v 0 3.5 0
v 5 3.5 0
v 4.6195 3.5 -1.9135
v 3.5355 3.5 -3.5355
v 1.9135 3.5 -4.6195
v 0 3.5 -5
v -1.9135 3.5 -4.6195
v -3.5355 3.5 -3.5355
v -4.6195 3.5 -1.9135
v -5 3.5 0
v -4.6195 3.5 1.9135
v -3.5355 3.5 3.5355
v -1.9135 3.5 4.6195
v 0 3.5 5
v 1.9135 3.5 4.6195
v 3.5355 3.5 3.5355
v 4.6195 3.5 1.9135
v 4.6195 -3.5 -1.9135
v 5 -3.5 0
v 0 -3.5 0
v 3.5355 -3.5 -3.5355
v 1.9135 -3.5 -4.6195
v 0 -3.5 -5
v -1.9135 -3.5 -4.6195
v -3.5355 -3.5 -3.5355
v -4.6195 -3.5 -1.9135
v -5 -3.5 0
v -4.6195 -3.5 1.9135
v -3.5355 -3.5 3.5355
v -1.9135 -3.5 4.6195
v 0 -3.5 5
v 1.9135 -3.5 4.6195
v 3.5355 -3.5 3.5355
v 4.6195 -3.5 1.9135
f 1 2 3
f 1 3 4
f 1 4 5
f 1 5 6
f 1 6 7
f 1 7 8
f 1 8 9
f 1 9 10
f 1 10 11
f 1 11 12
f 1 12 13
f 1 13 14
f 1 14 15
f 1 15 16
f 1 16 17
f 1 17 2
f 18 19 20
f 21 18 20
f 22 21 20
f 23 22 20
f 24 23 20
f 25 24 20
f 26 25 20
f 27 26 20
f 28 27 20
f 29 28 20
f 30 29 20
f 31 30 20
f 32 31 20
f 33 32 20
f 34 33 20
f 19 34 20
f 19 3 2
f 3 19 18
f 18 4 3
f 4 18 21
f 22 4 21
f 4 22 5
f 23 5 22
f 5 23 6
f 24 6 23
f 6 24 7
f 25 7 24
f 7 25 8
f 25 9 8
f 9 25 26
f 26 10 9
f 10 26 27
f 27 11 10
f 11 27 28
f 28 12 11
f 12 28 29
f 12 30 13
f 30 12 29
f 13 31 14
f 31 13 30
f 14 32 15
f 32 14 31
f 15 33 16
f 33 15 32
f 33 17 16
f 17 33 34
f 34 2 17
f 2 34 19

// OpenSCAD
// file: ../p/4-4edge.scad
use <../lib.scad>
function ldraw_lib__4_4edge() = [
// 0 Circle 1.0
// 0 Name: 4-4edge.dat
// 0 Author: James Jessiman
// 0 !LDRAW_ORG Primitive UPDATE 2017-01
// 0 !LICENSE Licensed under CC BY 4.0 : see CAreadme.txt
// 
// 0 BFC CERTIFY CCW
  [0,"BFC","CERTIFY"],
  [0,"BFC","CCW"],
// 
// 0 !HISTORY 1998-12-15 [PTadmin] Official Update 1998-10
// 0 !HISTORY 2005-12-28 [PTadmin] Official Update 2005-01
// 0 !HISTORY 2007-06-24 [PTadmin] Header formatted for Contributor Agreement
// 0 !HISTORY 2008-07-01 [PTadmin] Official Update 2008-01
// 0 !HISTORY 2017-01-15 [Steffen] BFCed
// 0 !HISTORY 2017-12-30 [PTadmin] Official Update 2017-01
// 
// 
// 2 24 1 0 0 0.9239 0 0.3827
  [2,24,1,0,0,0.9239,0,0.3827],
// 2 24 0.9239 0 0.3827 0.7071 0 0.7071
  [2,24,0.9239,0,0.3827,0.7071,0,0.7071],
// 2 24 0.7071 0 0.7071 0.3827 0 0.9239
  [2,24,0.7071,0,0.7071,0.3827,0,0.9239],
// 2 24 0.3827 0 0.9239 0 0 1
  [2,24,0.3827,0,0.9239,0,0,1],
// 2 24 0 0 1 -0.3827 0 0.9239
  [2,24,0,0,1,-0.3827,0,0.9239],
// 2 24 -0.3827 0 0.9239 -0.7071 0 0.7071
  [2,24,-0.3827,0,0.9239,-0.7071,0,0.7071],
// 2 24 -0.7071 0 0.7071 -0.9239 0 0.3827
  [2,24,-0.7071,0,0.7071,-0.9239,0,0.3827],
// 2 24 -0.9239 0 0.3827 -1 0 -0
  [2,24,-0.9239,0,0.3827,-1,0,-0],
// 2 24 -1 0 -0 -0.9239 0 -0.3827
  [2,24,-1,0,-0,-0.9239,0,-0.3827],
// 2 24 -0.9239 0 -0.3827 -0.7071 0 -0.7071
  [2,24,-0.9239,0,-0.3827,-0.7071,0,-0.7071],
// 2 24 -0.7071 0 -0.7071 -0.3827 0 -0.9239
  [2,24,-0.7071,0,-0.7071,-0.3827,0,-0.9239],
// 2 24 -0.3827 0 -0.9239 0 0 -1
  [2,24,-0.3827,0,-0.9239,0,0,-1],
// 2 24 0 0 -1 0.3827 0 -0.9239
  [2,24,0,0,-1,0.3827,0,-0.9239],
// 2 24 0.3827 0 -0.9239 0.7071 0 -0.7071
  [2,24,0.3827,0,-0.9239,0.7071,0,-0.7071],
// 2 24 0.7071 0 -0.7071 0.9239 0 -0.3827
  [2,24,0.7071,0,-0.7071,0.9239,0,-0.3827],
// 2 24 0.9239 0 -0.3827 1 0 0
  [2,24,0.9239,0,-0.3827,1,0,0],
];
module ldraw_lib__4_4edge(step=0, col=false, unit=2/5, alt=false, line=0.2, solid=!$preview)
    makepoly(ldraw_lib__4_4edge(), step=step, col=col, unit=unit, alt=alt, line=line, solid=solid);
ldraw_lib__4_4edge(line=0.2);
// file: ../p/4-4cyli.scad
use <../lib.scad>
function ldraw_lib__4_4cyli() = [
// 0 Cylinder 1.0
// 0 Name: 4-4cyli.dat
// 0 Author: James Jessiman
// 0 !LDRAW_ORG Primitive UPDATE 2005-01
// 0 !LICENSE Licensed under CC BY 4.0 : see CAreadme.txt
// 
// 0 BFC CERTIFY CCW
  [0,"BFC","CERTIFY"],
  [0,"BFC","CCW"],
// 
// 0 !HISTORY 1998-12-15 [PTadmin] Official Update 1998-10
// 0 !HISTORY 2002-03-23 [sbliss] Added BFC statement; merged headers from files in distributions LDraw 0.27 and Complete.
// 0 !HISTORY 2002-04-25 [PTadmin] Official Update 2002-02
// 0 !HISTORY 2004-12-14 [guyvivan] BFC CCW
// 0 !HISTORY 2005-12-28 [PTadmin] Official Update 2005-01
// 0 !HISTORY 2007-06-24 [PTadmin] Header formatted for Contributor Agreement
// 0 !HISTORY 2008-07-01 [PTadmin] Official Update 2008-01
// 
// 
// 4 16 1 1 0 0.9239 1 0.3827 0.9239 0 0.3827 1 0 0
  [4,16,1,1,0,0.9239,1,0.3827,0.9239,0,0.3827,1,0,0],
// 5 24 1 0 0 1 1 0 0.9239 0 0.3827 0.9239 0 -0.3827
  [5,24,1,0,0,1,1,0,0.9239,0,0.3827,0.9239,0,-0.3827],
// 4 16 0.9239 1 0.3827 0.7071 1 0.7071 0.7071 0 0.7071 0.9239 0 0.3827
  [4,16,0.9239,1,0.3827,0.7071,1,0.7071,0.7071,0,0.7071,0.9239,0,0.3827],
// 5 24 0.9239 0 0.3827 0.9239 1 0.3827 0.7071 0 0.7071 1 0 0
  [5,24,0.9239,0,0.3827,0.9239,1,0.3827,0.7071,0,0.7071,1,0,0],
// 4 16 0.7071 1 0.7071 0.3827 1 0.9239 0.3827 0 0.9239 0.7071 0 0.7071
  [4,16,0.7071,1,0.7071,0.3827,1,0.9239,0.3827,0,0.9239,0.7071,0,0.7071],
// 5 24 0.7071 0 0.7071 0.7071 1 0.7071 0.3827 0 0.9239 0.9239 0 0.3827
  [5,24,0.7071,0,0.7071,0.7071,1,0.7071,0.3827,0,0.9239,0.9239,0,0.3827],
// 4 16 0.3827 1 0.9239 0 1 1 0 0 1 0.3827 0 0.9239
  [4,16,0.3827,1,0.9239,0,1,1,0,0,1,0.3827,0,0.9239],
// 5 24 0.3827 0 0.9239 0.3827 1 0.9239 0 0 1 0.7071 0 0.7071
  [5,24,0.3827,0,0.9239,0.3827,1,0.9239,0,0,1,0.7071,0,0.7071],
// 4 16 0 1 1 -0.3827 1 0.9239 -0.3827 0 0.9239 0 0 1
  [4,16,0,1,1,-0.3827,1,0.9239,-0.3827,0,0.9239,0,0,1],
// 5 24 0 0 1 0 1 1 -0.3827 0 0.9239 0.3827 0 0.9239
  [5,24,0,0,1,0,1,1,-0.3827,0,0.9239,0.3827,0,0.9239],
// 4 16 -0.3827 1 0.9239 -0.7071 1 0.7071 -0.7071 0 0.7071 -0.3827 0 0.9239
  [4,16,-0.3827,1,0.9239,-0.7071,1,0.7071,-0.7071,0,0.7071,-0.3827,0,0.9239],
// 5 24 -0.3827 0 0.9239 -0.3827 1 0.9239 -0.7071 0 0.7071 0 0 1
  [5,24,-0.3827,0,0.9239,-0.3827,1,0.9239,-0.7071,0,0.7071,0,0,1],
// 4 16 -0.7071 1 0.7071 -0.9239 1 0.3827 -0.9239 0 0.3827 -0.7071 0 0.7071
  [4,16,-0.7071,1,0.7071,-0.9239,1,0.3827,-0.9239,0,0.3827,-0.7071,0,0.7071],
// 5 24 -0.7071 0 0.7071 -0.7071 1 0.7071 -0.9239 0 0.3827 -0.3827 0 0.9239
  [5,24,-0.7071,0,0.7071,-0.7071,1,0.7071,-0.9239,0,0.3827,-0.3827,0,0.9239],
// 4 16 -0.9239 1 0.3827 -1 1 0 -1 0 0 -0.9239 0 0.3827
  [4,16,-0.9239,1,0.3827,-1,1,0,-1,0,0,-0.9239,0,0.3827],
// 5 24 -0.9239 0 0.3827 -0.9239 1 0.3827 -1 0 0 -0.7071 0 0.7071
  [5,24,-0.9239,0,0.3827,-0.9239,1,0.3827,-1,0,0,-0.7071,0,0.7071],
// 4 16 -1 1 0 -0.9239 1 -0.3827 -0.9239 0 -0.3827 -1 0 0
  [4,16,-1,1,0,-0.9239,1,-0.3827,-0.9239,0,-0.3827,-1,0,0],
// 5 24 -1 0 0 -1 1 0 -0.9239 0 -0.3827 -0.9239 0 0.3827
  [5,24,-1,0,0,-1,1,0,-0.9239,0,-0.3827,-0.9239,0,0.3827],
// 4 16 -0.9239 1 -0.3827 -0.7071 1 -0.7071 -0.7071 0 -0.7071 -0.9239 0 -0.3827
  [4,16,-0.9239,1,-0.3827,-0.7071,1,-0.7071,-0.7071,0,-0.7071,-0.9239,0,-0.3827],
// 5 24 -0.9239 0 -0.3827 -0.9239 1 -0.3827 -0.7071 0 -0.7071 -1 0 0
  [5,24,-0.9239,0,-0.3827,-0.9239,1,-0.3827,-0.7071,0,-0.7071,-1,0,0],
// 4 16 -0.7071 1 -0.7071 -0.3827 1 -0.9239 -0.3827 0 -0.9239 -0.7071 0 -0.7071
  [4,16,-0.7071,1,-0.7071,-0.3827,1,-0.9239,-0.3827,0,-0.9239,-0.7071,0,-0.7071],
// 5 24 -0.7071 0 -0.7071 -0.7071 1 -0.7071 -0.3827 0 -0.9239 -0.9239 0 -0.3827
  [5,24,-0.7071,0,-0.7071,-0.7071,1,-0.7071,-0.3827,0,-0.9239,-0.9239,0,-0.3827],
// 4 16 -0.3827 1 -0.9239 0 1 -1 0 0 -1 -0.3827 0 -0.9239
  [4,16,-0.3827,1,-0.9239,0,1,-1,0,0,-1,-0.3827,0,-0.9239],
// 5 24 -0.3827 0 -0.9239 -0.3827 1 -0.9239 0 0 -1 -0.7071 0 -0.7071
  [5,24,-0.3827,0,-0.9239,-0.3827,1,-0.9239,0,0,-1,-0.7071,0,-0.7071],
// 4 16 0 1 -1 0.3827 1 -0.9239 0.3827 0 -0.9239 0 0 -1
  [4,16,0,1,-1,0.3827,1,-0.9239,0.3827,0,-0.9239,0,0,-1],
// 5 24 0 0 -1 0 1 -1 0.3827 0 -0.9239 -0.3827 0 -0.9239
  [5,24,0,0,-1,0,1,-1,0.3827,0,-0.9239,-0.3827,0,-0.9239],
// 4 16 0.3827 1 -0.9239 0.7071 1 -0.7071 0.7071 0 -0.7071 0.3827 0 -0.9239
  [4,16,0.3827,1,-0.9239,0.7071,1,-0.7071,0.7071,0,-0.7071,0.3827,0,-0.9239],
// 5 24 0.3827 0 -0.9239 0.3827 1 -0.9239 0.7071 0 -0.7071 0 0 -1
  [5,24,0.3827,0,-0.9239,0.3827,1,-0.9239,0.7071,0,-0.7071,0,0,-1],
// 4 16 0.7071 1 -0.7071 0.9239 1 -0.3827 0.9239 0 -0.3827 0.7071 0 -0.7071
  [4,16,0.7071,1,-0.7071,0.9239,1,-0.3827,0.9239,0,-0.3827,0.7071,0,-0.7071],
// 5 24 0.7071 0 -0.7071 0.7071 1 -0.7071 0.9239 0 -0.3827 0.3827 0 -0.9239
  [5,24,0.7071,0,-0.7071,0.7071,1,-0.7071,0.9239,0,-0.3827,0.3827,0,-0.9239],
// 4 16 0.9239 1 -0.3827 1 1 0 1 0 0 0.9239 0 -0.3827
  [4,16,0.9239,1,-0.3827,1,1,0,1,0,0,0.9239,0,-0.3827],
// 5 24 0.9239 0 -0.3827 0.9239 1 -0.3827 1 0 0 0.7071 0 -0.7071
  [5,24,0.9239,0,-0.3827,0.9239,1,-0.3827,1,0,0,0.7071,0,-0.7071],
// 0
];
module ldraw_lib__4_4cyli(step=0, col=false, unit=2/5, alt=false, line=0.2, solid=!$preview)
    makepoly(ldraw_lib__4_4cyli(), step=step, col=col, unit=unit, alt=alt, line=line, solid=solid);
ldraw_lib__4_4cyli(line=0.2);
// file: ../p/4-4disc.scad
use <../lib.scad>
function ldraw_lib__4_4disc() = [
// 0 Disc 1.0
// 0 Name: 4-4disc.dat
// 0 Author: James Jessiman
// 0 !LDRAW_ORG Primitive UPDATE 2002-02
// 0 !LICENSE Licensed under CC BY 4.0 : see CAreadme.txt
// 
// 0 BFC CERTIFY CCW
  [0,"BFC","CERTIFY"],
  [0,"BFC","CCW"],
// 
// 0 !HISTORY 1998-12-15 [PTadmin] Official Update 1998-10
// 0 !HISTORY 2002-03-23 [sbliss] Added BFC statement
// 0 !HISTORY 2002-04-25 [PTadmin] Official Update 2002-02
// 0 !HISTORY 2007-06-24 [PTadmin] Header formatted for Contributor Agreement
// 0 !HISTORY 2008-07-01 [PTadmin] Official Update 2008-01
// 
// 
// 3 16 0 0 0 1 0 0 0.9239 0 0.3827
  [3,16,0,0,0,1,0,0,0.9239,0,0.3827],
// 3 16 0 0 0 0.9239 0 0.3827 0.7071 0 0.7071
  [3,16,0,0,0,0.9239,0,0.3827,0.7071,0,0.7071],
// 3 16 0 0 0 0.7071 0 0.7071 0.3827 0 0.9239
  [3,16,0,0,0,0.7071,0,0.7071,0.3827,0,0.9239],
// 3 16 0 0 0 0.3827 0 0.9239 0 0 1
  [3,16,0,0,0,0.3827,0,0.9239,0,0,1],
// 3 16 0 0 0 0 0 1 -0.3827 0 0.9239
  [3,16,0,0,0,0,0,1,-0.3827,0,0.9239],
// 3 16 0 0 0 -0.3827 0 0.9239 -0.7071 0 0.7071
  [3,16,0,0,0,-0.3827,0,0.9239,-0.7071,0,0.7071],
// 3 16 0 0 0 -0.7071 0 0.7071 -0.9239 0 0.3827
  [3,16,0,0,0,-0.7071,0,0.7071,-0.9239,0,0.3827],
// 3 16 0 0 0 -0.9239 0 0.3827 -1 0 -0
  [3,16,0,0,0,-0.9239,0,0.3827,-1,0,-0],
// 3 16 0 0 0 -1 0 -0 -0.9239 0 -0.3827
  [3,16,0,0,0,-1,0,-0,-0.9239,0,-0.3827],
// 3 16 0 0 0 -0.9239 0 -0.3827 -0.7071 0 -0.7071
  [3,16,0,0,0,-0.9239,0,-0.3827,-0.7071,0,-0.7071],
// 3 16 0 0 0 -0.7071 0 -0.7071 -0.3827 0 -0.9239
  [3,16,0,0,0,-0.7071,0,-0.7071,-0.3827,0,-0.9239],
// 3 16 0 0 0 -0.3827 0 -0.9239 0 0 -1
  [3,16,0,0,0,-0.3827,0,-0.9239,0,0,-1],
// 3 16 0 0 0 0 0 -1 0.3827 0 -0.9239
  [3,16,0,0,0,0,0,-1,0.3827,0,-0.9239],
// 3 16 0 0 0 0.3827 0 -0.9239 0.7071 0 -0.7071
  [3,16,0,0,0,0.3827,0,-0.9239,0.7071,0,-0.7071],
// 3 16 0 0 0 0.7071 0 -0.7071 0.9239 0 -0.3827
  [3,16,0,0,0,0.7071,0,-0.7071,0.9239,0,-0.3827],
// 3 16 0 0 0 0.9239 0 -0.3827 1 0 0
  [3,16,0,0,0,0.9239,0,-0.3827,1,0,0],
// 0
];
module ldraw_lib__4_4disc(step=0, col=false, unit=2/5, alt=false, line=0.2, solid=!$preview)
    makepoly(ldraw_lib__4_4disc(), step=step, col=col, unit=unit, alt=alt, line=line, solid=solid);
ldraw_lib__4_4disc(line=0.2);
// file: ../p/4-4cylo.scad
use <../lib.scad>
use <4-4cyli.scad>
use <4-4edge.scad>
function ldraw_lib__4_4cylo() = [
// 0 Cylinder Open 1.0
// 0 Name: 4-4cylo.dat
// 0 Author: Mark Kennedy [mkennedy]
// 0 !LDRAW_ORG Primitive UPDATE 2010-01
// 0 !LICENSE Licensed under CC BY 4.0 : see CAreadme.txt
// 
// 0 BFC CERTIFY CCW
  [0,"BFC","CERTIFY"],
  [0,"BFC","CCW"],
// 
// 0 !HISTORY 2010-04-05 [PTadmin] Official Update 2010-01
// 
// 
// 1 16 0 0 0 1 0 0 0 1 0 0 0 1 4-4edge.dat
  [1,16,0,0,0,1,0,0,0,1,0,0,0,1, ldraw_lib__4_4edge()],
// 1 16 0 1 0 1 0 0 0 1 0 0 0 1 4-4edge.dat
  [1,16,0,1,0,1,0,0,0,1,0,0,0,1, ldraw_lib__4_4edge()],
// 1 16 0 0 0 1 0 0 0 1 0 0 0 1 4-4cyli.dat
  [1,16,0,0,0,1,0,0,0,1,0,0,0,1, ldraw_lib__4_4cyli()],
// 0
];
module ldraw_lib__4_4cylo(step=0, col=false, unit=2/5, alt=false, line=0.2, solid=!$preview)
    makepoly(ldraw_lib__4_4cylo(), step=step, col=col, unit=unit, alt=alt, line=line, solid=solid);
ldraw_lib__4_4cylo(line=0.2);
// main file
use <../lib.scad>
use <../p/4-4cylo.scad>
use <../p/4-4disc.scad>
function ldraw_lib__70023b() = [
// 0 ~Magnet Cylindrical 7mm (17.5LDU)
// 0 Name: 70023b.dat
// 0 Author: Rene Rechthaler [Blechtaler]
// 0 !LDRAW_ORG Part UPDATE 2025-05
// 0 !LICENSE Licensed under CC BY 4.0 : see CAreadme.txt
// 
// 0 BFC CERTIFY CCW
  [0,"BFC","CERTIFY"],
  [0,"BFC","CCW"],
// 
// 0 !HISTORY 2025-03-17 [Blechtaler] Rework for correct magnet size
// 0 !HISTORY 2025-05-28 [OrionP] Official Update 2025-05
// 
// 1 16 0 0 8.75 12.5 0 0 0 0 12.5 0 -1 0 4-4disc.dat
  [1,16,0,0,8.75,12.5,0,0,0,0,12.5,0,-1,0, ldraw_lib__4_4disc()],
// 1 16 0 0 -8.75 12.5 0 0 0 0 12.5 0 1 0 4-4disc.dat
  [1,16,0,0,-8.75,12.5,0,0,0,0,12.5,0,1,0, ldraw_lib__4_4disc()],
// 1 16 0 0 -8.75 12.5 0 0 0 0 12.5 0 17.5 0 4-4cylo.dat
  [1,16,0,0,-8.75,12.5,0,0,0,0,12.5,0,17.5,0, ldraw_lib__4_4cylo()],
];
module ldraw_lib__70023b(step=0, col=false, unit=2/5, alt=false, line=0.2, solid=!$preview)
    makepoly(ldraw_lib__70023b(), step=step, col=col, unit=unit, alt=alt, line=line, solid=solid);
ldraw_lib__70023b(line=0.2);
